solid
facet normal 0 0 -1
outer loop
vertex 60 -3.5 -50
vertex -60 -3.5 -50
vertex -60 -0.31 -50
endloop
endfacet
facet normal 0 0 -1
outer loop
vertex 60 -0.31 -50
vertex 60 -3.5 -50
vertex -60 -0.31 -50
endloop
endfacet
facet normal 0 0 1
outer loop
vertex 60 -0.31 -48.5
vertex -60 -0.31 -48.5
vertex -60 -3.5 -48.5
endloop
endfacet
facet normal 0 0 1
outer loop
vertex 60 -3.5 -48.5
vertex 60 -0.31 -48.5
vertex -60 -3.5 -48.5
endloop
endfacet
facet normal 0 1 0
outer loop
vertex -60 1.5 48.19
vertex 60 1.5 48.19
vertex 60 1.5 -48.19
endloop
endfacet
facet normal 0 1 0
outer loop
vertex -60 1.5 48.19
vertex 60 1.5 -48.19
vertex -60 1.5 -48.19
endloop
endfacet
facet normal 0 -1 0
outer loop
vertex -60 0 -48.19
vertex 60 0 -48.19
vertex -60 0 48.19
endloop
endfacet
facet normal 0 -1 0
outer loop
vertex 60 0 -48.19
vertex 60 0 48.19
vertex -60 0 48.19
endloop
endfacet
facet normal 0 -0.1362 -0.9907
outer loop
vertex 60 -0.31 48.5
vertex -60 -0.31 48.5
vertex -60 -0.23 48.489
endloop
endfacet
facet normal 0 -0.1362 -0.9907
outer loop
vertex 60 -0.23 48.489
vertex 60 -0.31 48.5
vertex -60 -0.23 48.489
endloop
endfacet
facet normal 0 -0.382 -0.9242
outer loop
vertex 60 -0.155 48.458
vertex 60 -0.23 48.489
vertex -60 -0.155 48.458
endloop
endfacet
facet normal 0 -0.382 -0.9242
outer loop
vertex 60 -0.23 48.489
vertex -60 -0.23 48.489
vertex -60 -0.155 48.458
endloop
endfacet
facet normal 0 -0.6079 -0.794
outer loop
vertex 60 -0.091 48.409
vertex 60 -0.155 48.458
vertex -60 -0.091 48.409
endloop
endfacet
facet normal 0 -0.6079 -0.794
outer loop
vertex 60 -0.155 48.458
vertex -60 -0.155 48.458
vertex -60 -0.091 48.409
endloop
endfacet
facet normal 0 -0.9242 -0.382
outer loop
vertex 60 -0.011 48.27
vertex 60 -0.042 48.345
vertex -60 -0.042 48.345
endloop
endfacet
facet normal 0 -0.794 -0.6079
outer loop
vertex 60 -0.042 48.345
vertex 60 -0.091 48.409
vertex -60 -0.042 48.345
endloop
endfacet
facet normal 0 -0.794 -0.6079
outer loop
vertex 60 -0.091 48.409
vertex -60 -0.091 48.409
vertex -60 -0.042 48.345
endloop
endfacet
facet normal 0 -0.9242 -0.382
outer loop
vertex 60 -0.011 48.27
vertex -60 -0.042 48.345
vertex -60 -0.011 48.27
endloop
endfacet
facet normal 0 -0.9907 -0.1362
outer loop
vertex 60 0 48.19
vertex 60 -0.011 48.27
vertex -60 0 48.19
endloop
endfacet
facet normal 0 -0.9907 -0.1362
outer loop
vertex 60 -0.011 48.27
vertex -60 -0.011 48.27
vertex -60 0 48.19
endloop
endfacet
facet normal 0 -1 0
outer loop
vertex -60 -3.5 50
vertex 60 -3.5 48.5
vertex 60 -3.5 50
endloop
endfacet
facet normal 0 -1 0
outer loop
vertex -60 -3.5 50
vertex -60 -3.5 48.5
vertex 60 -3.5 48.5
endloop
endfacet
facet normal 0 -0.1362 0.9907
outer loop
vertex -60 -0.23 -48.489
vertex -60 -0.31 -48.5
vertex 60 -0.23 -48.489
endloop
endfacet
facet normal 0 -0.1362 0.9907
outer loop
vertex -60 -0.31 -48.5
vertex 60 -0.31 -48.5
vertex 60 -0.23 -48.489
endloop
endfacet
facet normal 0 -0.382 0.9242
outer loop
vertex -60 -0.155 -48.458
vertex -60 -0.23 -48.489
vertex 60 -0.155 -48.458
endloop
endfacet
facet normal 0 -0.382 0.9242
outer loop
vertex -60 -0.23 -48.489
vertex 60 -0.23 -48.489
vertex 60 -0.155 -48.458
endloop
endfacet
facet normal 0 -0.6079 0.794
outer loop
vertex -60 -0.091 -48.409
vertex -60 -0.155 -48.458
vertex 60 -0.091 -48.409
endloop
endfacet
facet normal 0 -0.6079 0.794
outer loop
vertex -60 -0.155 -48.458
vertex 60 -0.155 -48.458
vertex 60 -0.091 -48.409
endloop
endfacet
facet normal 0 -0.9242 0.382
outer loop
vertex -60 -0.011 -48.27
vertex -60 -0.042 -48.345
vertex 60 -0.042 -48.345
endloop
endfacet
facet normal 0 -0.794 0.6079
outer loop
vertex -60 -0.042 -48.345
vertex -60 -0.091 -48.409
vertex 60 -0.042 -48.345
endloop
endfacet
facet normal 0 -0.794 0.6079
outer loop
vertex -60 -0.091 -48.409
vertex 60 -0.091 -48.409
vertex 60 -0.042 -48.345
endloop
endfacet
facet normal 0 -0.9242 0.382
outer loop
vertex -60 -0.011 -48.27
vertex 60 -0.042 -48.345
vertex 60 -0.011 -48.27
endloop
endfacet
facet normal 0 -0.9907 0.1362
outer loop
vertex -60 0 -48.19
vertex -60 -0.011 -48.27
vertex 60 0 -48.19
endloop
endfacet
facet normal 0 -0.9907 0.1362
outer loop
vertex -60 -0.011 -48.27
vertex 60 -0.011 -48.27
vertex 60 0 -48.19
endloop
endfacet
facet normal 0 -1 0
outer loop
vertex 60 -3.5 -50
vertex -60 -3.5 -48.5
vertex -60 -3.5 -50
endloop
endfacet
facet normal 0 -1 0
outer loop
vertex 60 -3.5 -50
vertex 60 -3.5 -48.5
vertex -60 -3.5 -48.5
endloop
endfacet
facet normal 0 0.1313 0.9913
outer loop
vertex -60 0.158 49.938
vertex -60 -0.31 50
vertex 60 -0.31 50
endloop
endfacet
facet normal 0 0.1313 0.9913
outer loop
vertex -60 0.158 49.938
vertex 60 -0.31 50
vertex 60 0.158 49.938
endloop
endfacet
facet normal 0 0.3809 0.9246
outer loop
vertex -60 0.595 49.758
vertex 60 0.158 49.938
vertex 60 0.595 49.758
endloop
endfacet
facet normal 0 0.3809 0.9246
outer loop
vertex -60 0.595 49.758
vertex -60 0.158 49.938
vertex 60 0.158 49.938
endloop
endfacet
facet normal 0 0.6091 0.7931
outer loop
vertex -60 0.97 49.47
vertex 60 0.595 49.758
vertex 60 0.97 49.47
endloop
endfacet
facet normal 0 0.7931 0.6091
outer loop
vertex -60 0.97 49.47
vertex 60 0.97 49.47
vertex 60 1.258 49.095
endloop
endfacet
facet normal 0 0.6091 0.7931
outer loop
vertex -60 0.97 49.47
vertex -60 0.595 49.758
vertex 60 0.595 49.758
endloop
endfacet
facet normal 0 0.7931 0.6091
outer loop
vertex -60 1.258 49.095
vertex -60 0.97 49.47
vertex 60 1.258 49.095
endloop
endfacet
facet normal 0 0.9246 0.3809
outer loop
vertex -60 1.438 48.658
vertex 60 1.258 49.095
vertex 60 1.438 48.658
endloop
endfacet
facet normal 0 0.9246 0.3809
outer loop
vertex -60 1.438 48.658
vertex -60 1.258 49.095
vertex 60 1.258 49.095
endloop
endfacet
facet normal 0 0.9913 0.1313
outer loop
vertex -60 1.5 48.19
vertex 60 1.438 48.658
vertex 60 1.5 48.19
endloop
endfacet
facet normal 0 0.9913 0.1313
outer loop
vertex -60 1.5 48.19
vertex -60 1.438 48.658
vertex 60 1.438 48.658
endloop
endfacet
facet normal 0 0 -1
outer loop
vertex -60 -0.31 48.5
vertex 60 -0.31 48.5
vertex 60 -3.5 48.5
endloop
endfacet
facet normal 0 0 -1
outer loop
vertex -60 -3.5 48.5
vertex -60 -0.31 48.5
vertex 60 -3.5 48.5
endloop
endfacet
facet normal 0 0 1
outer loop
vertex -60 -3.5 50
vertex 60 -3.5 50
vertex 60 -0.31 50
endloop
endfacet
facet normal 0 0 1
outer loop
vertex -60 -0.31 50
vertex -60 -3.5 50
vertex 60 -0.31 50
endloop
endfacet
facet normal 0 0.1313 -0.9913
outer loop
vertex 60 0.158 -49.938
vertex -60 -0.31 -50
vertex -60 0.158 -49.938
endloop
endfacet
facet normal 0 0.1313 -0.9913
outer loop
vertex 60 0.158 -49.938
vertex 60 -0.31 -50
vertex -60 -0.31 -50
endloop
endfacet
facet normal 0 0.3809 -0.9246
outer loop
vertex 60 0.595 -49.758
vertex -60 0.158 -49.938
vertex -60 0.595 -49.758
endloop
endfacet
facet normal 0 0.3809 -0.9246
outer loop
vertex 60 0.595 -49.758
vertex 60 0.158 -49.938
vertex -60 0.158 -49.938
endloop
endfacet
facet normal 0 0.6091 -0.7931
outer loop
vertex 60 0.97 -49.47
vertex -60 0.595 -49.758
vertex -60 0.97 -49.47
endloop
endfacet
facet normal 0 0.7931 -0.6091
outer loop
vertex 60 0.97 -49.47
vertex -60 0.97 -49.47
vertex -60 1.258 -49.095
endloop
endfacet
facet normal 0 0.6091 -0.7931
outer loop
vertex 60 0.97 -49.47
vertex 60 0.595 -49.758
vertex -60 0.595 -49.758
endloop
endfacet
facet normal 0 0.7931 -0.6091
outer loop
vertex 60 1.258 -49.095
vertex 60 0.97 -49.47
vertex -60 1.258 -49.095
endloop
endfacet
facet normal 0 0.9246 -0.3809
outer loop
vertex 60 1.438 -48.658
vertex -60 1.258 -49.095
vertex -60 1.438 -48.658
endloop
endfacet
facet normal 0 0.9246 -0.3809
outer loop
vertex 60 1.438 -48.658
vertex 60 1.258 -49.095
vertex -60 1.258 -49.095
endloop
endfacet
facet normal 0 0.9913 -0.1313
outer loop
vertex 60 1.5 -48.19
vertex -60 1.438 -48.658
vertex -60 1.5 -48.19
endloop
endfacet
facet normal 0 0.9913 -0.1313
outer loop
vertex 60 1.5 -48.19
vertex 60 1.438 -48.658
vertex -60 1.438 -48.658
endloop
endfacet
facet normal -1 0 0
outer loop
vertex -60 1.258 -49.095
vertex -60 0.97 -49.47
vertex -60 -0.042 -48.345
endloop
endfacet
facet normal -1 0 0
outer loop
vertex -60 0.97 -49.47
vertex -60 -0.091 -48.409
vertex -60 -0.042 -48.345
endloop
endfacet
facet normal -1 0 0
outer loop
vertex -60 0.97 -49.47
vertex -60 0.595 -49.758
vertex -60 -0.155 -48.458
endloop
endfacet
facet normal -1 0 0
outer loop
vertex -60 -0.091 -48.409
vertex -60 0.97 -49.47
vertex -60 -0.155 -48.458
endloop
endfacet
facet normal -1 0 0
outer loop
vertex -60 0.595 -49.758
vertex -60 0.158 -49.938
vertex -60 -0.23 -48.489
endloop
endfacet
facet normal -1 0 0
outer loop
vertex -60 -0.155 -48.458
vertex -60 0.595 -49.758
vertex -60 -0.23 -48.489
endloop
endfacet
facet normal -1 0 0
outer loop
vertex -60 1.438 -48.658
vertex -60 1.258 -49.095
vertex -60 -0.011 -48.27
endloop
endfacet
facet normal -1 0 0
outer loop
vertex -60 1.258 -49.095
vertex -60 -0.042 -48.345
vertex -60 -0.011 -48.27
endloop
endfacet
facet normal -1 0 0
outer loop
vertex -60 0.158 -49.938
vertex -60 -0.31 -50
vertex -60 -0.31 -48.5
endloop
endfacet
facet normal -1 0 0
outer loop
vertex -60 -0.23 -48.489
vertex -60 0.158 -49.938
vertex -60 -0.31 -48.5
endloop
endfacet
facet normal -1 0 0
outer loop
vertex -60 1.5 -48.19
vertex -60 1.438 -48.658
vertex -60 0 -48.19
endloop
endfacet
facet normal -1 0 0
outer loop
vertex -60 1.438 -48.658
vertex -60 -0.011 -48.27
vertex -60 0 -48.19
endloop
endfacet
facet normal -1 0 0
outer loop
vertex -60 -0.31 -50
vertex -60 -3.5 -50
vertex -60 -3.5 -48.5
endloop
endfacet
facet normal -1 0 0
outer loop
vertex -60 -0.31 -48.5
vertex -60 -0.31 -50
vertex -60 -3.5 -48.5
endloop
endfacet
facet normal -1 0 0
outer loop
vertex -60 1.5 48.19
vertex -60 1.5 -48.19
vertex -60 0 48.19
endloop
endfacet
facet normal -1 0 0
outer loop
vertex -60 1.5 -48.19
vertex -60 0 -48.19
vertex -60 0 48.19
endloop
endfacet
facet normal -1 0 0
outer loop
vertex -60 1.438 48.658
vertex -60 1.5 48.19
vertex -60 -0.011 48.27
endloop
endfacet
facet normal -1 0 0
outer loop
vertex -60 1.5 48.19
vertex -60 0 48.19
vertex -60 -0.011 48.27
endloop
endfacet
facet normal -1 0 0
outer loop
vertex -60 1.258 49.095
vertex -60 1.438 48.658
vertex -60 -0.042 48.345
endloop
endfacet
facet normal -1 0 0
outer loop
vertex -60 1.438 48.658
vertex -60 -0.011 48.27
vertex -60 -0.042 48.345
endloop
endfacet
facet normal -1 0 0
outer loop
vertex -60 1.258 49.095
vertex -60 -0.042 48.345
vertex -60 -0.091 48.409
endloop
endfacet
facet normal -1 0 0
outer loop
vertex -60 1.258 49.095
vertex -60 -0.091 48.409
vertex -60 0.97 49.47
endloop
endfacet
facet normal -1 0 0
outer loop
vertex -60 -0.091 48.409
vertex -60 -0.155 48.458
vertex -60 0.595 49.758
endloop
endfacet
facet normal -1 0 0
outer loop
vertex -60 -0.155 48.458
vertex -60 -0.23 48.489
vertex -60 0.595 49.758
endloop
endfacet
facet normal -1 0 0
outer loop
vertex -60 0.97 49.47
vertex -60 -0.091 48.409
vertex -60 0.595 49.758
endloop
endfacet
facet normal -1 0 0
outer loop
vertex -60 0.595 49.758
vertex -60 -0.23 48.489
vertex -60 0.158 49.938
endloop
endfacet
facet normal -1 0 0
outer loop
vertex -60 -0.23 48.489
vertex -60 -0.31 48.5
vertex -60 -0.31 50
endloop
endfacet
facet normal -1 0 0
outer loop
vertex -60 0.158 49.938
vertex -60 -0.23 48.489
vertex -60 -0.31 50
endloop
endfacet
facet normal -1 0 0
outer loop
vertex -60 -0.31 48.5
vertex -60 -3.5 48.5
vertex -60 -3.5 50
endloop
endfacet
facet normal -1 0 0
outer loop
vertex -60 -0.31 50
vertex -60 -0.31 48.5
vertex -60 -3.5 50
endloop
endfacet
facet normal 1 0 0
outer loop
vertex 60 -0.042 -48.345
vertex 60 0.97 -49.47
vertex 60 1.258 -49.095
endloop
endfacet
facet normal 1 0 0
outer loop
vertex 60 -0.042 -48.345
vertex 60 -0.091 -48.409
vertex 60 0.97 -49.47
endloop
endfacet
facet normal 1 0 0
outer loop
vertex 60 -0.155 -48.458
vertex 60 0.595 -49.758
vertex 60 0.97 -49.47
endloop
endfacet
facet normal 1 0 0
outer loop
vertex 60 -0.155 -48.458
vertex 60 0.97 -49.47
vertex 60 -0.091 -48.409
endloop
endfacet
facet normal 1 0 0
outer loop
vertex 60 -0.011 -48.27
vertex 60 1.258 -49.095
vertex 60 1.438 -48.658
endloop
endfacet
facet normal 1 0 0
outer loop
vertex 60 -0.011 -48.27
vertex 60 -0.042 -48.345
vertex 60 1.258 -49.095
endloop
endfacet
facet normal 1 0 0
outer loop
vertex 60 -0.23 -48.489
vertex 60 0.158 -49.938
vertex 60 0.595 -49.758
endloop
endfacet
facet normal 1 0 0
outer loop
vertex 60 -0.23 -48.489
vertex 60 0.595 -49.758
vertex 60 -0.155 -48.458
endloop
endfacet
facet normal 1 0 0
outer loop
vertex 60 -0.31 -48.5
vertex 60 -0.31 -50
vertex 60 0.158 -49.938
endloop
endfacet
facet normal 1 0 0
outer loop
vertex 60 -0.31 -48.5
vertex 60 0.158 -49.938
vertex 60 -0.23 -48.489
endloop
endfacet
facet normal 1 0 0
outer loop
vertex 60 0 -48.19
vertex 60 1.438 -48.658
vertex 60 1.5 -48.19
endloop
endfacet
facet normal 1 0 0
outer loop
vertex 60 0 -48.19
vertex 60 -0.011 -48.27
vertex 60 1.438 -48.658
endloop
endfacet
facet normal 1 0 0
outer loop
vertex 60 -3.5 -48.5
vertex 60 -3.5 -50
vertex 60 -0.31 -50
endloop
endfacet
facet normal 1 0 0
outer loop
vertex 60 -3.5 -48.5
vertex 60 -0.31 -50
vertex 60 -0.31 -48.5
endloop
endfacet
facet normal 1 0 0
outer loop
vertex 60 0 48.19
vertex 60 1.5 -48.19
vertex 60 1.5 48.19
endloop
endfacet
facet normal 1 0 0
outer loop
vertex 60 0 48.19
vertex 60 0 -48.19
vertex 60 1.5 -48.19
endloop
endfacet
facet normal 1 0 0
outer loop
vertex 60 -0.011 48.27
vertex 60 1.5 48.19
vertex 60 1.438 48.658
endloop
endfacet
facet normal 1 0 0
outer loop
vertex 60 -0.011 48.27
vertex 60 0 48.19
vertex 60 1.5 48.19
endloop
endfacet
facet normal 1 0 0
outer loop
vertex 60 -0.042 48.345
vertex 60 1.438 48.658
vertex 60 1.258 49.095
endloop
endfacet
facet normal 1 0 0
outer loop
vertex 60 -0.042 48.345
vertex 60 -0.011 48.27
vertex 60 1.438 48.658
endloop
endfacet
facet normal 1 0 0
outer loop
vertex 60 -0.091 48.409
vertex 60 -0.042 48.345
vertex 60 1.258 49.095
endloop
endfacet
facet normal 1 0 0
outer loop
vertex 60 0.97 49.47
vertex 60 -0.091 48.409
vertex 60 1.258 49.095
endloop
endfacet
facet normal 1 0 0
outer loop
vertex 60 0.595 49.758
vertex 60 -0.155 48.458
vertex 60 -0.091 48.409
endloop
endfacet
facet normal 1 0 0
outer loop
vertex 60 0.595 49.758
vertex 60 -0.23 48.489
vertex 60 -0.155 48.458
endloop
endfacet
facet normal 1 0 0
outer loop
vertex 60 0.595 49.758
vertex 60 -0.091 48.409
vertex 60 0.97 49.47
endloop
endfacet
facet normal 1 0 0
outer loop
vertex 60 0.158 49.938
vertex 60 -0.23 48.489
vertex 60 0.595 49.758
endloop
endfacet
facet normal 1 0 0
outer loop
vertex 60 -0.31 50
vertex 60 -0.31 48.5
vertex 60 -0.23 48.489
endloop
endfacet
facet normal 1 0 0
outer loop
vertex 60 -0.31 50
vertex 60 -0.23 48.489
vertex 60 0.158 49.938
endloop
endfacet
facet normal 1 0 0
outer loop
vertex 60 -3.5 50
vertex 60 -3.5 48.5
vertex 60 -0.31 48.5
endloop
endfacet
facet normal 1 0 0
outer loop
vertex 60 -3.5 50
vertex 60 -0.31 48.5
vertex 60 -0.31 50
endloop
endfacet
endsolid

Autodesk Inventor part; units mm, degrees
ref_plane "YZ Plane" through (0, 0, 0) normal (1, 0, 0) x (0, 1, 0)
ref_plane "XZ Plane" through (0, 0, 0) normal (0, 1, 0) x (-1, 0, 0)
ref_plane "XY Plane" through (0, 0, 0) normal (0, 0, 1) x (1, 0, 0)
sketch "Sketch1" plane through (0, 0, 0) normal (0, 1, 0) x (-1, 0, 0)
  line L0 (60, -50) -> (-60, -50)
  line L1 (-60, -50) -> (-60, 50)
  line L2 (-60, 50) -> (60, 50)
  line L3 (60, 50) -> (60, -50)
  point P0 (0, 0)
  dimension "d0" = 120
  dimension "d1" = 100
  dimension "d2" = 50
  dimension "d3" = 60
extrude "Plate1" add sketch "Sketch1" along normal blind 1.5
sketch "Sketch2" plane through (60, 1.5, -48.5) normal (0, 0, -1) x (-1, 0, 0)
  line L0 (120, 0) -> (0, 0)
  line L1 (0, 0) -> (0, -5)
  line L2 (0, -5) -> (120, -5)
  line L3 (120, -5) -> (120, 0)
edge flange "Flange1" height 5 angle 90 thickness 1.5 bend radius 0.31 thickness toward (0, 0, -1) relief tear relief width 1.5 relief depth 0.75 corner gap 0.31 corner form 0 edges at (0, 0, -50) (0, 0, 50) wall of the first edge with corners at (-60, 1.5, -48.5) (60, 1.5, -48.5) (60, -3.5, -48.5) (-60, -3.5, -48.5)
bend "Bend1"
corner "Corner1"
equation "\"d4\" = Thickness"
equation "\"d5\" = BendReliefWidth"
equation "\"d6\" = BendReliefDepth"
equation "\"d7\" = MinimumRemnant"
equation "\"d8\" = TransitionRadius"
equation "\"d11\" = BendRadius"
equation "\"d12\" = CornerReliefSize"
equation "\"d13\" = GapSize"
equation "\"d14\" = JacobiRadiusSize"
equation "\"BendReliefWidth\" = Thickness"
equation "\"BendReliefDepth\" = 0.5 * Thickness"
equation "\"CornerReliefSize\" = 4 * Thickness"
equation "\"MinimumRemnant\" = 2 * Thickness"
equation "\"TransitionRadius\" = BendRadius"
equation "\"JacobiRadiusSize\" = BendRadius"
equation "\"GapSize\" = Thickness"
equation "\"Thickness\" = 1.5"
equation "\"BendRadius\" = 0.31"
properties part number "axis_12_bottom_frame(bottom)" material "Aluminum 6061-AHC"
